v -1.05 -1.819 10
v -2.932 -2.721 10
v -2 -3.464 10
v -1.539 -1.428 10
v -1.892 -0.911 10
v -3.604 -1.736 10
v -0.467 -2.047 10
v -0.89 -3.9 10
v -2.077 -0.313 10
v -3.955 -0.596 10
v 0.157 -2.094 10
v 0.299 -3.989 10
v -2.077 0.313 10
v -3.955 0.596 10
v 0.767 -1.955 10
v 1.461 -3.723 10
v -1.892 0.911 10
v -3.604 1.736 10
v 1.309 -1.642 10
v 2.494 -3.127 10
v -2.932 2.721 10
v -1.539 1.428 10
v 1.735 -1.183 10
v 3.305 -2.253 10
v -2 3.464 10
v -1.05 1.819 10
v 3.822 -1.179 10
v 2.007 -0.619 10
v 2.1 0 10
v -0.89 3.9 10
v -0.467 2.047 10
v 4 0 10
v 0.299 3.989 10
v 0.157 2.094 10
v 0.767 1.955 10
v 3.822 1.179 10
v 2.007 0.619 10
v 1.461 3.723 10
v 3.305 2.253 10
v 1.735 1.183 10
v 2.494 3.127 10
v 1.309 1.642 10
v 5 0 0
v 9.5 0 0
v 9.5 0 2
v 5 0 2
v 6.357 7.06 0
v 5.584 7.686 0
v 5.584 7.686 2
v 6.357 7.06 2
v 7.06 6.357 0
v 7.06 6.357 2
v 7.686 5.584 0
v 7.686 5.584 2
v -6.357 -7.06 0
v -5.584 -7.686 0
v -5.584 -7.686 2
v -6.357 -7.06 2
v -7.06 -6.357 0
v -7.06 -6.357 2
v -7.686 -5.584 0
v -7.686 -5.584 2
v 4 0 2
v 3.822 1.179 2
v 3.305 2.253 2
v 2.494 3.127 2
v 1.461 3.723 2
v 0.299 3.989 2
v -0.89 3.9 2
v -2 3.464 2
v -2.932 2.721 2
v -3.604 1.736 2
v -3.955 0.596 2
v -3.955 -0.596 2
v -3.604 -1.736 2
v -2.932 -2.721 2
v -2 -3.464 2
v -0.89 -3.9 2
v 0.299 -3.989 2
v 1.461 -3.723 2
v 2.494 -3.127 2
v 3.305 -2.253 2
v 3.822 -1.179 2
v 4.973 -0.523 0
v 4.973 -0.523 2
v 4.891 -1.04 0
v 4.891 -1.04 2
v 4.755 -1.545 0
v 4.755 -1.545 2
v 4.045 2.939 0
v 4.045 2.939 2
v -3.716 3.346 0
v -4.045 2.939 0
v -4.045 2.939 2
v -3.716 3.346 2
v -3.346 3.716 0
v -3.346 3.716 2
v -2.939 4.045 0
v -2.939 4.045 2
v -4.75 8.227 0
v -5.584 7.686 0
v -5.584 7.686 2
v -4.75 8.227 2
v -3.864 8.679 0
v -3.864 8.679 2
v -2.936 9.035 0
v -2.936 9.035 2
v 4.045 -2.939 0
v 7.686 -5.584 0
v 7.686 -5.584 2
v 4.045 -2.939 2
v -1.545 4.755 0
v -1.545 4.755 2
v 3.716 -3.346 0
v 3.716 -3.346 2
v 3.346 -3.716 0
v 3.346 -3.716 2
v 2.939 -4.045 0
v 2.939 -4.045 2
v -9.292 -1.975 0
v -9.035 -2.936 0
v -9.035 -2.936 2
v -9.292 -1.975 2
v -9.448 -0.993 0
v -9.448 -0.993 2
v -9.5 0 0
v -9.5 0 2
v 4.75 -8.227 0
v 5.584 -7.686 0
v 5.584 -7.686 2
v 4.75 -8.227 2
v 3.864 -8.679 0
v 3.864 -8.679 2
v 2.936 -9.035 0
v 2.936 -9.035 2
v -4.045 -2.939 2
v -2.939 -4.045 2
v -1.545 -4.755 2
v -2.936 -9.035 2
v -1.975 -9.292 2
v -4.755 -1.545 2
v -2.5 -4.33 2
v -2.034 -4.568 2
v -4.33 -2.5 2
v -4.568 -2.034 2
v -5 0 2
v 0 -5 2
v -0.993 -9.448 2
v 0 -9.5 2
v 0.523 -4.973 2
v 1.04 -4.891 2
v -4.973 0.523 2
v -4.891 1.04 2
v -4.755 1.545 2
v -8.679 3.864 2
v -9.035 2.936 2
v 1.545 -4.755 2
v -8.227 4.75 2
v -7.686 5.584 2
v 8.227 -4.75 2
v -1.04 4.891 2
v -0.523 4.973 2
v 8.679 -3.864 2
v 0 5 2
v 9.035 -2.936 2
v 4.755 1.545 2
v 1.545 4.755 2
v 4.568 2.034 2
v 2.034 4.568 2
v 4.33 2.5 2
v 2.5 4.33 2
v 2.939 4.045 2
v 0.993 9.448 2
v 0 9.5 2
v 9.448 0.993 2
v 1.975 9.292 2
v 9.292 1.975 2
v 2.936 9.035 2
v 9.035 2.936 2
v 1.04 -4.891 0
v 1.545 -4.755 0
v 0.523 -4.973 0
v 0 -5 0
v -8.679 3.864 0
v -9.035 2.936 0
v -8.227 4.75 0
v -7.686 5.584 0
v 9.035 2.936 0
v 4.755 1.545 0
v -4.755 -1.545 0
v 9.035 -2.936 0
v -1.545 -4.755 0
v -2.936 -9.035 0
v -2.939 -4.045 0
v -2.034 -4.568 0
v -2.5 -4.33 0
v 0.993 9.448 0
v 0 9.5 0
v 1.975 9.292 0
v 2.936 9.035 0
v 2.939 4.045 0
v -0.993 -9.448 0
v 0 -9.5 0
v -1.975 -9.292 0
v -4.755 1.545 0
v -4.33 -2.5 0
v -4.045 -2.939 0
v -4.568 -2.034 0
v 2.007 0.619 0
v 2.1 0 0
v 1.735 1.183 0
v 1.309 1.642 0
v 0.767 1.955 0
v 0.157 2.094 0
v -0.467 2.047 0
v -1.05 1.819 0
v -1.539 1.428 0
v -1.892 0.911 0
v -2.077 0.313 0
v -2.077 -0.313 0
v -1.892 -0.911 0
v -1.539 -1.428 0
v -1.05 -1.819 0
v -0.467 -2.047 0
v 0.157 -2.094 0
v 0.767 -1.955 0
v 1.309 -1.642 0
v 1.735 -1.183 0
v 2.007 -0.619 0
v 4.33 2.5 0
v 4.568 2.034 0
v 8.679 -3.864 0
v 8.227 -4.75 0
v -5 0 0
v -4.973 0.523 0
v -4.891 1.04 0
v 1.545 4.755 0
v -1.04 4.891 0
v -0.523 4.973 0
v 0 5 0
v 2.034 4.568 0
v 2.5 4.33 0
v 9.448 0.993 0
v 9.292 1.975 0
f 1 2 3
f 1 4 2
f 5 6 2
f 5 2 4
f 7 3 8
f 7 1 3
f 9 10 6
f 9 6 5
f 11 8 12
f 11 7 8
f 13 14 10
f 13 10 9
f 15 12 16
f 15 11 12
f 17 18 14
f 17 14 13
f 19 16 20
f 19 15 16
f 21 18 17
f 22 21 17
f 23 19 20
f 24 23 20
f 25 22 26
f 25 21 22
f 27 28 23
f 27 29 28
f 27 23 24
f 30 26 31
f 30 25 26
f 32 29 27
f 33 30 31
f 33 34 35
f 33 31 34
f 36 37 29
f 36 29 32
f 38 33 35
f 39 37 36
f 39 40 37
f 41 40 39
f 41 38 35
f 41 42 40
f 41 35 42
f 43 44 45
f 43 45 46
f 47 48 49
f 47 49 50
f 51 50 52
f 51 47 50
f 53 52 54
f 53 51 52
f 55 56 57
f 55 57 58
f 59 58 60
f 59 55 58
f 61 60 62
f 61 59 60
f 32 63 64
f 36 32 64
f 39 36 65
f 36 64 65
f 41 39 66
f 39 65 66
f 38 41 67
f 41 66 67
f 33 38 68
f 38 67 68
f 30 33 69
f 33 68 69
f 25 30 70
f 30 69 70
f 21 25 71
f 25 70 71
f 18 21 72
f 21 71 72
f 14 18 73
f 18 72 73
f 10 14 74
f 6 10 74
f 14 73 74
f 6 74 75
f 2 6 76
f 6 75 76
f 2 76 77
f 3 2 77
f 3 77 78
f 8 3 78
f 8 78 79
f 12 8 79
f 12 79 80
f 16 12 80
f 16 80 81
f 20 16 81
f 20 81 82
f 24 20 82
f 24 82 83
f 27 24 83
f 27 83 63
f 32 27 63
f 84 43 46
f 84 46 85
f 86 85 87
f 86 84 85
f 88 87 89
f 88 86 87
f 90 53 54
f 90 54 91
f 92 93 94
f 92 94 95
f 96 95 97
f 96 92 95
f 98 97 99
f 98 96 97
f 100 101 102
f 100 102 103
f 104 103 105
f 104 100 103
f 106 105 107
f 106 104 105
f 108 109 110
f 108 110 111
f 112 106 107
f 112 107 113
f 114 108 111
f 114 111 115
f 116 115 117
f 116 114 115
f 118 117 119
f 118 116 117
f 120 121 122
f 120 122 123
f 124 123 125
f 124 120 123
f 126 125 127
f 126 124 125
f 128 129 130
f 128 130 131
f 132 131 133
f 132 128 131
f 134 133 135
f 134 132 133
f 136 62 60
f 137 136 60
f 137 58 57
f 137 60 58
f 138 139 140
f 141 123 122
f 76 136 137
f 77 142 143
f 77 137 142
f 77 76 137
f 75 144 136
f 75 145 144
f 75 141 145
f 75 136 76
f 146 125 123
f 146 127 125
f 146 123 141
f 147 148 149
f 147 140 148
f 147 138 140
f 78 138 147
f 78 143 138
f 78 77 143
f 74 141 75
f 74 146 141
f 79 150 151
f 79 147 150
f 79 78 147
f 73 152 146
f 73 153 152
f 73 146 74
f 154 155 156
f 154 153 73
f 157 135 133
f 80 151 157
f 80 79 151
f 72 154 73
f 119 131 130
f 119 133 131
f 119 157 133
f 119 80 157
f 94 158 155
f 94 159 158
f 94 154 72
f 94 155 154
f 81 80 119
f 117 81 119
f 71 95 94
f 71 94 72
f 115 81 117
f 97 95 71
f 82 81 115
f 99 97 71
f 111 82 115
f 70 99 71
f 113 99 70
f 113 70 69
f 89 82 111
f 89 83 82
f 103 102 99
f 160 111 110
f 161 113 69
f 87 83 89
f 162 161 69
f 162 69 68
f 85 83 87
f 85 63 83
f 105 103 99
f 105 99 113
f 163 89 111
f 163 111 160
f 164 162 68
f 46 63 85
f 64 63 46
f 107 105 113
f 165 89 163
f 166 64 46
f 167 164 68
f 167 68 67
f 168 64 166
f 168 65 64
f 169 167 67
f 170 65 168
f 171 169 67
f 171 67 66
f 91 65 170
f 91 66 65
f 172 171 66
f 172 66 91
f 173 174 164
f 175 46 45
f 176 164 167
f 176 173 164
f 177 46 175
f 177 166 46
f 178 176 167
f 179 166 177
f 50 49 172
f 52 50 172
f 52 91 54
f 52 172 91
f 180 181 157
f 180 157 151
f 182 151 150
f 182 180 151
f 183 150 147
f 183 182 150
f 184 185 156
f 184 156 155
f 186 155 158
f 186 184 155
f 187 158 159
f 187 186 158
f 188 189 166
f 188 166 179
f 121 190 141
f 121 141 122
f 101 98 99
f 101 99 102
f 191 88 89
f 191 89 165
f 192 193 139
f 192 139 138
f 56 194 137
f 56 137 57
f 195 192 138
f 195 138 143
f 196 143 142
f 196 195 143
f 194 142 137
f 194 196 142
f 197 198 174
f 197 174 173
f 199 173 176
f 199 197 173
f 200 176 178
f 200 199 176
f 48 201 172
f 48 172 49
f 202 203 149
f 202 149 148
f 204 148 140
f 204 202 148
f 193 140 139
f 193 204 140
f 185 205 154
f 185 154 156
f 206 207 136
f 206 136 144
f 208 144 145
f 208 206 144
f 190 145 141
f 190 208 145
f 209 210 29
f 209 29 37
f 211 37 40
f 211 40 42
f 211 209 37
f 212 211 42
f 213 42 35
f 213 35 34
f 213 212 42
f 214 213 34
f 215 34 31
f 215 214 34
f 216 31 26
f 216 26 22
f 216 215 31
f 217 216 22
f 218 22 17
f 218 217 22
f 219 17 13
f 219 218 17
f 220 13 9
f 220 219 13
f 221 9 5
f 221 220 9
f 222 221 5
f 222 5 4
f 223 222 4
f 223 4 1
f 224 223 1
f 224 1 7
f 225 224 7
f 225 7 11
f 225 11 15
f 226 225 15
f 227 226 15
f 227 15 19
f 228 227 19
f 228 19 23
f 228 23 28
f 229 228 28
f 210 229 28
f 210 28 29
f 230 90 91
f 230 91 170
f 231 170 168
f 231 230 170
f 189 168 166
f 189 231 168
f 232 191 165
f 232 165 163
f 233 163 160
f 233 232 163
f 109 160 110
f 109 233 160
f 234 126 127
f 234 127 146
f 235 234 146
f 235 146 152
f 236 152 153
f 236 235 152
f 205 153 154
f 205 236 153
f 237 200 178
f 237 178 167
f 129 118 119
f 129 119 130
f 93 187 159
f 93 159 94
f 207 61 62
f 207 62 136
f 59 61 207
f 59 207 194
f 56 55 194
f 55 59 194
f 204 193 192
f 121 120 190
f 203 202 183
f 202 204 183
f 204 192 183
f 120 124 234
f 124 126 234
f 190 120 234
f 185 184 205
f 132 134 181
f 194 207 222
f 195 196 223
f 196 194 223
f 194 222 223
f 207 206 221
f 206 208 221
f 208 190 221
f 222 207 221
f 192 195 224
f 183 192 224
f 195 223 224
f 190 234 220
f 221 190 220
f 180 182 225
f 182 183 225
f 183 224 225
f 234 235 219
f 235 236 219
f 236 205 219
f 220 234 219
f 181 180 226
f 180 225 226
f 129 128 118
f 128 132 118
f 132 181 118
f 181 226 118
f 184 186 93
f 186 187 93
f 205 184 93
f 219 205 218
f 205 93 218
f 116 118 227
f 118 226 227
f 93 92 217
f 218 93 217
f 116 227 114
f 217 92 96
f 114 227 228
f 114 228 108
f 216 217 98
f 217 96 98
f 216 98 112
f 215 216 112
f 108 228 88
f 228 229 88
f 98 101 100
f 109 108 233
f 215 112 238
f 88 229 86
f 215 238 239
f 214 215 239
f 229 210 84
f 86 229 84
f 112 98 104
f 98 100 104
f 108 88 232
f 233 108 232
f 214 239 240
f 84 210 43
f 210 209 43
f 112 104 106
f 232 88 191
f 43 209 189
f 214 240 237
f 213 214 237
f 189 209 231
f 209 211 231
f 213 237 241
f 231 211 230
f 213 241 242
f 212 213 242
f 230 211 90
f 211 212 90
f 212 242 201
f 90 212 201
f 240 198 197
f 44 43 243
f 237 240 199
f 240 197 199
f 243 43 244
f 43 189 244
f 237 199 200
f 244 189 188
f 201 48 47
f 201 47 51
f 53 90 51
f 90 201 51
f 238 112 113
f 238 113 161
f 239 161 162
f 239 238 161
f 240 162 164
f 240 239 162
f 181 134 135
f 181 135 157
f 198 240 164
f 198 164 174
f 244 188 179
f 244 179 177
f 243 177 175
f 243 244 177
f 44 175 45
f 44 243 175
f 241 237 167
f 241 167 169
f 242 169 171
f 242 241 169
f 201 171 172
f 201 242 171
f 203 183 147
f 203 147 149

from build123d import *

# Parameters (mm, degrees)
ESQUISSE1_R        = 2.1
BOSS_EXTRU_3_DEPTH = 2
ESQUISSE1_3_R      = 4
ESQUISSE1_3_R_2    = 2.1
BOSS_EXTRU_4_DEPTH = 10


with BuildPart() as part:
    # Esquisse1 → Boss.-Extru.3 (new body)
    with BuildSketch(Plane.XY):
        with BuildLine():
            Line((0, 9.5), (0, 5))
            ThreePointArc((0, 5), (-0.782172325, 4.938441703), (-1.545084972, 4.755282581))
            Line((-1.545084972, 4.755282581), (-2.935661447, 9.035036905))
            ThreePointArc((-2.935661447, 9.035036905), (-4.312909748, 8.46456198), (-5.583959897, 7.685661447))
            Line((-5.583959897, 7.685661447), (-2.938926261, 4.045084972))
            ThreePointArc((-2.938926261, 4.045084972), (-3.535533906, 3.535533906), (-4.045084972, 2.938926261))
            Line((-4.045084972, 2.938926261), (-7.685661447, 5.583959897))
            ThreePointArc((-7.685661447, 5.583959897), (-8.46456198, 4.312909748), (-9.035036905, 2.935661447))
            Line((-9.035036905, 2.935661447), (-4.755282581, 1.545084972))
            ThreePointArc((-4.755282581, 1.545084972), (-4.938441703, 0.782172325), (-5, 0))
            Line((-5, 0), (-9.5, 0))
            ThreePointArc((-9.5, 0), (-9.383039236, -1.486127418), (-9.035036905, -2.935661447))
            Line((-9.035036905, -2.935661447), (-4.755282581, -1.545084972))
            ThreePointArc((-4.755282581, -1.545084972), (-4.455032621, -2.269952499), (-4.045084972, -2.938926261))
            Line((-4.045084972, -2.938926261), (-7.685661447, -5.583959897))
            ThreePointArc((-7.685661447, -5.583959897), (-6.717514421, -6.717514421), (-5.583959897, -7.685661447))
            Line((-5.583959897, -7.685661447), (-2.938926261, -4.045084972))
            ThreePointArc((-2.938926261, -4.045084972), (-2.269952499, -4.455032621), (-1.545084972, -4.755282581))
            Line((-1.545084972, -4.755282581), (-2.935661447, -9.035036905))
            ThreePointArc((-2.935661447, -9.035036905), (-1.486127418, -9.383039236), (0, -9.5))
            Line((0, -9.5), (0, -5))
            ThreePointArc((0, -5), (0.782172325, -4.938441703), (1.545084972, -4.755282581))
            Line((1.545084972, -4.755282581), (2.935661447, -9.035036905))
            ThreePointArc((2.935661447, -9.035036905), (4.312909748, -8.46456198), (5.583959897, -7.685661447))
            Line((5.583959897, -7.685661447), (2.938926261, -4.045084972))
            ThreePointArc((2.938926261, -4.045084972), (3.535533906, -3.535533906), (4.045084972, -2.938926261))
            Line((4.045084972, -2.938926261), (7.685661447, -5.583959897))
            ThreePointArc((7.685661447, -5.583959897), (8.46456198, -4.312909748), (9.035036905, -2.935661447))
            Line((9.035036905, -2.935661447), (4.755282581, -1.545084972))
            ThreePointArc((4.755282581, -1.545084972), (4.938441703, -0.782172325), (5, 0))
            Line((5, 0), (9.5, 0))
            ThreePointArc((9.5, 0), (9.383039236, 1.486127418), (9.035036905, 2.935661447))
            Line((9.035036905, 2.935661447), (4.755282581, 1.545084972))
            ThreePointArc((4.755282581, 1.545084972), (4.455032621, 2.269952499), (4.045084972, 2.938926261))
            Line((4.045084972, 2.938926261), (7.685661447, 5.583959897))
            ThreePointArc((7.685661447, 5.583959897), (6.717514421, 6.717514421), (5.583959897, 7.685661447))
            Line((5.583959897, 7.685661447), (2.938926261, 4.045084972))
            ThreePointArc((2.938926261, 4.045084972), (2.269952499, 4.455032621), (1.545084972, 4.755282581))
            Line((1.545084972, 4.755282581), (2.935661447, 9.035036905))
            ThreePointArc((2.935661447, 9.035036905), (1.486127418, 9.383039236), (0, 9.5))
        make_face()
        Circle(ESQUISSE1_R, mode=Mode.SUBTRACT)
    extrude(amount=BOSS_EXTRU_3_DEPTH)

    # Esquisse1<3> → Boss.-Extru.4 (add)
    with BuildSketch(Plane.XY):
        Circle(ESQUISSE1_3_R)
        Circle(ESQUISSE1_3_R_2, mode=Mode.SUBTRACT)
    extrude(amount=BOSS_EXTRU_4_DEPTH)


solid = part.part
